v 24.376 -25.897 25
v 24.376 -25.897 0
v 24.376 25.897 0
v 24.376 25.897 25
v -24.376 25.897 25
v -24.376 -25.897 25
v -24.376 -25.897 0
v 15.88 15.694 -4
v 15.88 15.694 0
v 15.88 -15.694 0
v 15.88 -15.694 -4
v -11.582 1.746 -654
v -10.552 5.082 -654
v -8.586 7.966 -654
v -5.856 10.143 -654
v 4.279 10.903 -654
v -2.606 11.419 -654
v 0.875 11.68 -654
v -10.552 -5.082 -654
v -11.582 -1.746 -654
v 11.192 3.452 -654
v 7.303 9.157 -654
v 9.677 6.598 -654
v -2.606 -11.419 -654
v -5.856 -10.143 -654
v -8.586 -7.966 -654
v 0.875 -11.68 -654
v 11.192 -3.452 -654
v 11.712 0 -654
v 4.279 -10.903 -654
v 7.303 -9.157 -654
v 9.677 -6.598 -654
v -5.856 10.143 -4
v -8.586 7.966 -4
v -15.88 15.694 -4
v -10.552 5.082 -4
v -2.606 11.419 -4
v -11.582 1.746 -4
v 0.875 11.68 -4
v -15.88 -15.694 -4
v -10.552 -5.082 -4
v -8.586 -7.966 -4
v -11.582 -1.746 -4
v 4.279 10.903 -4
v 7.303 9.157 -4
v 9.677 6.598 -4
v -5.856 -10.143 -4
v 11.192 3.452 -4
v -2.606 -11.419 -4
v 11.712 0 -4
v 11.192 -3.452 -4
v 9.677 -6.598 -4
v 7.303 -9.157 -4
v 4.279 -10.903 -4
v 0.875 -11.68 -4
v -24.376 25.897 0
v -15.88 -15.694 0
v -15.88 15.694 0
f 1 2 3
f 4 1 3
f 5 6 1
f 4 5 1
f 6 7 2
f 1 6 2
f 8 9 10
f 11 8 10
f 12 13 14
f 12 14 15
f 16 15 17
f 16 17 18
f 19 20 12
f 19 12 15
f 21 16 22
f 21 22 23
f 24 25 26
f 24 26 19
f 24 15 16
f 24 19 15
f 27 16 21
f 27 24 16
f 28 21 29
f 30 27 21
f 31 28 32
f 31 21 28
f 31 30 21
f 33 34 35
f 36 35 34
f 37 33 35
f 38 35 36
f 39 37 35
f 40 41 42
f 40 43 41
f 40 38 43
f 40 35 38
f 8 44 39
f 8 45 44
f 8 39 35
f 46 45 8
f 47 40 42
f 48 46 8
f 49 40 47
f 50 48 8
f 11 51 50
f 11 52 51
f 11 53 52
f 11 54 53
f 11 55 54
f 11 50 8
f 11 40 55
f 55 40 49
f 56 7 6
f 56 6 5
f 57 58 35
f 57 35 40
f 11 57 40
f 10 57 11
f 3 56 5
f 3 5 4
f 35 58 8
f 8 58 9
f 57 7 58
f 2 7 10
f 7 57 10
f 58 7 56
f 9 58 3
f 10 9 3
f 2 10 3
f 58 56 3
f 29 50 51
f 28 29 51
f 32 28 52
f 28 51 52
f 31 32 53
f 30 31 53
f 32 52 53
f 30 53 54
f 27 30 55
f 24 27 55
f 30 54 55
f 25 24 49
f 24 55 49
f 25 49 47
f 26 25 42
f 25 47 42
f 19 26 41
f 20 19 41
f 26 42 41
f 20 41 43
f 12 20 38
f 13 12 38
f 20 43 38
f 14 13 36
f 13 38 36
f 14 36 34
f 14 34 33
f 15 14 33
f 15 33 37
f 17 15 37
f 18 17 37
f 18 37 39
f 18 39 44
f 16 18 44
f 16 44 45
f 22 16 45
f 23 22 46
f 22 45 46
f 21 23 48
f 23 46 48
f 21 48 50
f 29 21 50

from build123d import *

# Parameters (mm, degrees)
F0_W     = 48.751022
F0_H     = 51.794138
F1_DEPTH = 25
F2_W     = 31.759218
F2_H     = 31.388528
F3_DEPTH = 4
F4_R     = 11.712322
F5_DEPTH = 650


with BuildPart() as f1:
    # F0 (on Top) → F1 (new body)
    with BuildSketch(Plane.XY):
        Rectangle(F0_W, F0_H)
    extrude(amount=F1_DEPTH)

    # F2 (on face) → F3 (join)
    with BuildSketch(Plane(origin=(0, 0, 0), x_dir=(1, 0, 0), z_dir=(0, 0, -1))):
        Rectangle(F2_W, F2_H)
    extrude(amount=F3_DEPTH)

    # F4 (on face) → F5 (join)
    with BuildSketch(Plane(origin=(0, 0, -4), x_dir=(1, 0, 0), z_dir=(0, 0, -1))):
        Circle(F4_R)
    extrude(amount=F5_DEPTH)


solid = f1.part
